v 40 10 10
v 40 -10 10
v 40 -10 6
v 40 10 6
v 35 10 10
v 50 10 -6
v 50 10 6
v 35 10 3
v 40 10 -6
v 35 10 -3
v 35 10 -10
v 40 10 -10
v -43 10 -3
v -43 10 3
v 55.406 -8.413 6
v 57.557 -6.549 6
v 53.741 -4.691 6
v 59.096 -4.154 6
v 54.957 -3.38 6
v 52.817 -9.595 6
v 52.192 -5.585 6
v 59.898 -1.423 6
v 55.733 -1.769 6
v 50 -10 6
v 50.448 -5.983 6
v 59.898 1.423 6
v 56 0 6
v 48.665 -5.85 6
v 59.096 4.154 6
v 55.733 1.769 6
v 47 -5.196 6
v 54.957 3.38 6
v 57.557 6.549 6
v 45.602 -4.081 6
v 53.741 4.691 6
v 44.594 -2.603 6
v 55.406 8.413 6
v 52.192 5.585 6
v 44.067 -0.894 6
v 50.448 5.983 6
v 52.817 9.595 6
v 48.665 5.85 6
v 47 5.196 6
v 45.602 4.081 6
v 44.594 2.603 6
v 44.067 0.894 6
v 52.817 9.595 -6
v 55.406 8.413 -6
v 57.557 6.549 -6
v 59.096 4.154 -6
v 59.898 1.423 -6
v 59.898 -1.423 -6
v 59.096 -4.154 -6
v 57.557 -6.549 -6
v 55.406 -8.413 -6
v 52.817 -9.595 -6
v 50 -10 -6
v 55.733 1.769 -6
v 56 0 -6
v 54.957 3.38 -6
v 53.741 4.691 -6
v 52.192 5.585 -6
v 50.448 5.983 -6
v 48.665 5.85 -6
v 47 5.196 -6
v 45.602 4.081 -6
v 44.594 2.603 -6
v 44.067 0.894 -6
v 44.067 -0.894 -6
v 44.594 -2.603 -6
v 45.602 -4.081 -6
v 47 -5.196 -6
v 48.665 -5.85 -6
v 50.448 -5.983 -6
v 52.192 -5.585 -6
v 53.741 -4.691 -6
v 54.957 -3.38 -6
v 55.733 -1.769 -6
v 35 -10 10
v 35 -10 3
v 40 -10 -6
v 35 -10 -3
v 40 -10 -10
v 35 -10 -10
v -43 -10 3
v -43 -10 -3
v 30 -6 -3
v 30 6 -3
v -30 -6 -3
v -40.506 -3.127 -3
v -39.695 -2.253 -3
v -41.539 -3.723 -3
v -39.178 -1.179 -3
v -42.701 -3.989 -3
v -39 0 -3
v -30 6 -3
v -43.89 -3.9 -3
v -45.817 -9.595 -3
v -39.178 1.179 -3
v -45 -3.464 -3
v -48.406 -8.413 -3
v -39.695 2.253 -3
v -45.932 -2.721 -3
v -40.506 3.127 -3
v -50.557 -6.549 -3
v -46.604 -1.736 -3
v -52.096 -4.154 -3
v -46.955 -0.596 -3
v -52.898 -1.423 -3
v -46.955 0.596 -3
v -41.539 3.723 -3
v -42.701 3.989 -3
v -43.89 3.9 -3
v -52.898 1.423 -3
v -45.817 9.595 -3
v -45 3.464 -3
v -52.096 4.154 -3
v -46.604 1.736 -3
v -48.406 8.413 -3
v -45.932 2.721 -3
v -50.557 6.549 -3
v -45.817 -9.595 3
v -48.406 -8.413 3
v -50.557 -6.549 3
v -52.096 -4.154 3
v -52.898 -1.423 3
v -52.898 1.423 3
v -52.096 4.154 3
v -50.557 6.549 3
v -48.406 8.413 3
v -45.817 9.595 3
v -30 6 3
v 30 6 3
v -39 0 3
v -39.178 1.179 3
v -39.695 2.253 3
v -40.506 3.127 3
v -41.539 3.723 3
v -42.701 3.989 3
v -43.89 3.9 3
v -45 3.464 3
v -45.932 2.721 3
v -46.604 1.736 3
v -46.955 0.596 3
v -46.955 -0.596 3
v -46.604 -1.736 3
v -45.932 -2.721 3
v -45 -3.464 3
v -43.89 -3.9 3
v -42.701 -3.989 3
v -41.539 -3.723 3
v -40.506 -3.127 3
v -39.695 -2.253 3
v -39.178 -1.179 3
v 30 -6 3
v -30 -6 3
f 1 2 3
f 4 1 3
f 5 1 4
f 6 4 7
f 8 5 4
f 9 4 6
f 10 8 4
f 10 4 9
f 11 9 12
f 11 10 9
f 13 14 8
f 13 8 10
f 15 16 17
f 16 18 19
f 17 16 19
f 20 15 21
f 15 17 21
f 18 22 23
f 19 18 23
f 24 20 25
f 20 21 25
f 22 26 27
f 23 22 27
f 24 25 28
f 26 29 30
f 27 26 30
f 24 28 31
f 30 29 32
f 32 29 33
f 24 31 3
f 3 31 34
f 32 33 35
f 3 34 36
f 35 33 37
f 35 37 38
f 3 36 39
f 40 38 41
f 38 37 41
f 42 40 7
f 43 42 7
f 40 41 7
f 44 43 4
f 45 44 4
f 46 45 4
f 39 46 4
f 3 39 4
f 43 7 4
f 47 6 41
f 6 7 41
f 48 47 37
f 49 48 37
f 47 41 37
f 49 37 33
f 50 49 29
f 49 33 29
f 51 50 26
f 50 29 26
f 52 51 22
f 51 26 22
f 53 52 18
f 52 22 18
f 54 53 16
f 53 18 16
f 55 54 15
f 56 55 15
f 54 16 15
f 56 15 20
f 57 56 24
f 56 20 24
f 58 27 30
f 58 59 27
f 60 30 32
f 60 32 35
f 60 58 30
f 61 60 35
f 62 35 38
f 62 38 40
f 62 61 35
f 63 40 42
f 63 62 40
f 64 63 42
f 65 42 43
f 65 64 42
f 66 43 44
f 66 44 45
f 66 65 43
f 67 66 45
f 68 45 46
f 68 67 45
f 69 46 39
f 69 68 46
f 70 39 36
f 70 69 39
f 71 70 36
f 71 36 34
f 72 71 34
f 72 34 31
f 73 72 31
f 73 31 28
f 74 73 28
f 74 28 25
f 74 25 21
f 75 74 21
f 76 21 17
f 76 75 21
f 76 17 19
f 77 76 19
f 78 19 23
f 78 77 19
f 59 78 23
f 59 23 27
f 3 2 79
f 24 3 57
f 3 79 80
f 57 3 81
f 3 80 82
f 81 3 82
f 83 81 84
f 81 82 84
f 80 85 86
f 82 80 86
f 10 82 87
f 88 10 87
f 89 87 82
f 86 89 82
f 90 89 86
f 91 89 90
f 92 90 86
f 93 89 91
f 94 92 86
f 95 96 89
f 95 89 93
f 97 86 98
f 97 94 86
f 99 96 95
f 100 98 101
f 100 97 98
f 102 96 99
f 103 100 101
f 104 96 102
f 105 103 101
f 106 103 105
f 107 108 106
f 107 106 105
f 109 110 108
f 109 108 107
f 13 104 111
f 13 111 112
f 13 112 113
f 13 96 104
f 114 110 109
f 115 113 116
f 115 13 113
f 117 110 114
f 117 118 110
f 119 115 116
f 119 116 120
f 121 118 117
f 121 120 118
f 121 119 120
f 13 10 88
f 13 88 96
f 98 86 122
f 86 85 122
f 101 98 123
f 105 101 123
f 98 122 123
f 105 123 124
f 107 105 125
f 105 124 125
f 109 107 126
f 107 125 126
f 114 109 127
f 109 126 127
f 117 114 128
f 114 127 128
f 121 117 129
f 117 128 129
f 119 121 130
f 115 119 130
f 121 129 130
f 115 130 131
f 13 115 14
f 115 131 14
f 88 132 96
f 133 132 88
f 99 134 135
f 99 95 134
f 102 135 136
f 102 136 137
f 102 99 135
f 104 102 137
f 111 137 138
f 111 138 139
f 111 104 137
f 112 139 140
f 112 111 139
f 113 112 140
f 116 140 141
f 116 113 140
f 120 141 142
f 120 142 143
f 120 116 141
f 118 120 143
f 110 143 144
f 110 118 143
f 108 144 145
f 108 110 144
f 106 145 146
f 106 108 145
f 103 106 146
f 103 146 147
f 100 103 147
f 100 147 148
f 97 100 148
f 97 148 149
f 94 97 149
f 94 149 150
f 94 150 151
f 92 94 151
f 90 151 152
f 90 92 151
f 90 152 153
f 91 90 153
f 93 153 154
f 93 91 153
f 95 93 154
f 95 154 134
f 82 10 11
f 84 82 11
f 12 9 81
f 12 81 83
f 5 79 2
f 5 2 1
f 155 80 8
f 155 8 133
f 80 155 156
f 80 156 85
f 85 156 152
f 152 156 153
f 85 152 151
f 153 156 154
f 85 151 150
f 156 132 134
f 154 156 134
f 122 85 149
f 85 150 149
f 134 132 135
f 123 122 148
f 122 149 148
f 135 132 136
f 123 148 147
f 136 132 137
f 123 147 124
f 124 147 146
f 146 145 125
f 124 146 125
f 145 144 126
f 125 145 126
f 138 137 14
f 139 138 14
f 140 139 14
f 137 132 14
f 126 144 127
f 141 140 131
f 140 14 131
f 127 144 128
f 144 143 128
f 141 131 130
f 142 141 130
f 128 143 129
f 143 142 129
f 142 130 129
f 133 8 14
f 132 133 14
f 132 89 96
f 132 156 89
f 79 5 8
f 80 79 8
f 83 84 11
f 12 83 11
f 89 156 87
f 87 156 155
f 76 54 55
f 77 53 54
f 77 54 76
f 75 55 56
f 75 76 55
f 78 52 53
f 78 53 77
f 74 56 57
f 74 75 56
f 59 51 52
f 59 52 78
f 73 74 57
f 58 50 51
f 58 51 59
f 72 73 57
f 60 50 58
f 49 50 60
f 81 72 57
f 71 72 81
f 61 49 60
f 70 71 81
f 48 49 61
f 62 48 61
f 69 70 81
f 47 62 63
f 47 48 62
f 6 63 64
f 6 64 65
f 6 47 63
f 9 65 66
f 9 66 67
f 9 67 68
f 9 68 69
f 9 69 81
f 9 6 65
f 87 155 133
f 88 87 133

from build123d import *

# Parameters (mm, degrees)
SKETCH_1_R      = 4
SKETCH_1_W      = 60
SKETCH_1_H      = 12
EXTRUDE_1_DEPTH = 3
EXTRUDE_START   = 35
SKETCH_2_W      = 20
SKETCH_2_H      = 20
EXTRUDE_2_DEPTH = 5
SKETCH_3_R      = 6
EXTRUDE_3_DEPTH = 6


with BuildPart() as part:
    # 草图1 → 凸台-拉伸1 (new, symmetric)
    with BuildSketch(Plane.XY):
        with BuildLine():
            Line((-35, 10), (35, 10))
            Line((35, 10), (35, -10))
            Line((35, -10), (-35, -10))
            Line((-35, -10), (-43, -10))
            ThreePointArc((-43, -10), (-53, 0), (-43, 10))
            Line((-43, 10), (-35, 10))
        make_face()
        with Locations((-43, 0)):
            Circle(SKETCH_1_R, mode=Mode.SUBTRACT)
        Rectangle(SKETCH_1_W, SKETCH_1_H, mode=Mode.SUBTRACT)
    extrude(amount=EXTRUDE_1_DEPTH, both=True)

    # 草图2 → 凸台-拉伸2 (add)
    with BuildSketch(Plane(origin=(0, 0, 0), x_dir=(0, 0, -1), z_dir=(1, 0, 0)).offset(EXTRUDE_START)):
        Rectangle(SKETCH_2_W, SKETCH_2_H)
    extrude(amount=EXTRUDE_2_DEPTH)

    # 草图3 → 凸台-拉伸3 (add, symmetric)
    with BuildSketch(Plane.XY):
        with BuildLine():
            Line((40, 10), (50, 10))
            ThreePointArc((50, 10), (60, 0), (50, -10))
            Line((50, -10), (40, -10))
            Line((40, -10), (40, 10))
        make_face()
        with Locations((50, 0)):
            Circle(SKETCH_3_R, mode=Mode.SUBTRACT)
    extrude(amount=EXTRUDE_3_DEPTH, both=True)


solid = part.part
